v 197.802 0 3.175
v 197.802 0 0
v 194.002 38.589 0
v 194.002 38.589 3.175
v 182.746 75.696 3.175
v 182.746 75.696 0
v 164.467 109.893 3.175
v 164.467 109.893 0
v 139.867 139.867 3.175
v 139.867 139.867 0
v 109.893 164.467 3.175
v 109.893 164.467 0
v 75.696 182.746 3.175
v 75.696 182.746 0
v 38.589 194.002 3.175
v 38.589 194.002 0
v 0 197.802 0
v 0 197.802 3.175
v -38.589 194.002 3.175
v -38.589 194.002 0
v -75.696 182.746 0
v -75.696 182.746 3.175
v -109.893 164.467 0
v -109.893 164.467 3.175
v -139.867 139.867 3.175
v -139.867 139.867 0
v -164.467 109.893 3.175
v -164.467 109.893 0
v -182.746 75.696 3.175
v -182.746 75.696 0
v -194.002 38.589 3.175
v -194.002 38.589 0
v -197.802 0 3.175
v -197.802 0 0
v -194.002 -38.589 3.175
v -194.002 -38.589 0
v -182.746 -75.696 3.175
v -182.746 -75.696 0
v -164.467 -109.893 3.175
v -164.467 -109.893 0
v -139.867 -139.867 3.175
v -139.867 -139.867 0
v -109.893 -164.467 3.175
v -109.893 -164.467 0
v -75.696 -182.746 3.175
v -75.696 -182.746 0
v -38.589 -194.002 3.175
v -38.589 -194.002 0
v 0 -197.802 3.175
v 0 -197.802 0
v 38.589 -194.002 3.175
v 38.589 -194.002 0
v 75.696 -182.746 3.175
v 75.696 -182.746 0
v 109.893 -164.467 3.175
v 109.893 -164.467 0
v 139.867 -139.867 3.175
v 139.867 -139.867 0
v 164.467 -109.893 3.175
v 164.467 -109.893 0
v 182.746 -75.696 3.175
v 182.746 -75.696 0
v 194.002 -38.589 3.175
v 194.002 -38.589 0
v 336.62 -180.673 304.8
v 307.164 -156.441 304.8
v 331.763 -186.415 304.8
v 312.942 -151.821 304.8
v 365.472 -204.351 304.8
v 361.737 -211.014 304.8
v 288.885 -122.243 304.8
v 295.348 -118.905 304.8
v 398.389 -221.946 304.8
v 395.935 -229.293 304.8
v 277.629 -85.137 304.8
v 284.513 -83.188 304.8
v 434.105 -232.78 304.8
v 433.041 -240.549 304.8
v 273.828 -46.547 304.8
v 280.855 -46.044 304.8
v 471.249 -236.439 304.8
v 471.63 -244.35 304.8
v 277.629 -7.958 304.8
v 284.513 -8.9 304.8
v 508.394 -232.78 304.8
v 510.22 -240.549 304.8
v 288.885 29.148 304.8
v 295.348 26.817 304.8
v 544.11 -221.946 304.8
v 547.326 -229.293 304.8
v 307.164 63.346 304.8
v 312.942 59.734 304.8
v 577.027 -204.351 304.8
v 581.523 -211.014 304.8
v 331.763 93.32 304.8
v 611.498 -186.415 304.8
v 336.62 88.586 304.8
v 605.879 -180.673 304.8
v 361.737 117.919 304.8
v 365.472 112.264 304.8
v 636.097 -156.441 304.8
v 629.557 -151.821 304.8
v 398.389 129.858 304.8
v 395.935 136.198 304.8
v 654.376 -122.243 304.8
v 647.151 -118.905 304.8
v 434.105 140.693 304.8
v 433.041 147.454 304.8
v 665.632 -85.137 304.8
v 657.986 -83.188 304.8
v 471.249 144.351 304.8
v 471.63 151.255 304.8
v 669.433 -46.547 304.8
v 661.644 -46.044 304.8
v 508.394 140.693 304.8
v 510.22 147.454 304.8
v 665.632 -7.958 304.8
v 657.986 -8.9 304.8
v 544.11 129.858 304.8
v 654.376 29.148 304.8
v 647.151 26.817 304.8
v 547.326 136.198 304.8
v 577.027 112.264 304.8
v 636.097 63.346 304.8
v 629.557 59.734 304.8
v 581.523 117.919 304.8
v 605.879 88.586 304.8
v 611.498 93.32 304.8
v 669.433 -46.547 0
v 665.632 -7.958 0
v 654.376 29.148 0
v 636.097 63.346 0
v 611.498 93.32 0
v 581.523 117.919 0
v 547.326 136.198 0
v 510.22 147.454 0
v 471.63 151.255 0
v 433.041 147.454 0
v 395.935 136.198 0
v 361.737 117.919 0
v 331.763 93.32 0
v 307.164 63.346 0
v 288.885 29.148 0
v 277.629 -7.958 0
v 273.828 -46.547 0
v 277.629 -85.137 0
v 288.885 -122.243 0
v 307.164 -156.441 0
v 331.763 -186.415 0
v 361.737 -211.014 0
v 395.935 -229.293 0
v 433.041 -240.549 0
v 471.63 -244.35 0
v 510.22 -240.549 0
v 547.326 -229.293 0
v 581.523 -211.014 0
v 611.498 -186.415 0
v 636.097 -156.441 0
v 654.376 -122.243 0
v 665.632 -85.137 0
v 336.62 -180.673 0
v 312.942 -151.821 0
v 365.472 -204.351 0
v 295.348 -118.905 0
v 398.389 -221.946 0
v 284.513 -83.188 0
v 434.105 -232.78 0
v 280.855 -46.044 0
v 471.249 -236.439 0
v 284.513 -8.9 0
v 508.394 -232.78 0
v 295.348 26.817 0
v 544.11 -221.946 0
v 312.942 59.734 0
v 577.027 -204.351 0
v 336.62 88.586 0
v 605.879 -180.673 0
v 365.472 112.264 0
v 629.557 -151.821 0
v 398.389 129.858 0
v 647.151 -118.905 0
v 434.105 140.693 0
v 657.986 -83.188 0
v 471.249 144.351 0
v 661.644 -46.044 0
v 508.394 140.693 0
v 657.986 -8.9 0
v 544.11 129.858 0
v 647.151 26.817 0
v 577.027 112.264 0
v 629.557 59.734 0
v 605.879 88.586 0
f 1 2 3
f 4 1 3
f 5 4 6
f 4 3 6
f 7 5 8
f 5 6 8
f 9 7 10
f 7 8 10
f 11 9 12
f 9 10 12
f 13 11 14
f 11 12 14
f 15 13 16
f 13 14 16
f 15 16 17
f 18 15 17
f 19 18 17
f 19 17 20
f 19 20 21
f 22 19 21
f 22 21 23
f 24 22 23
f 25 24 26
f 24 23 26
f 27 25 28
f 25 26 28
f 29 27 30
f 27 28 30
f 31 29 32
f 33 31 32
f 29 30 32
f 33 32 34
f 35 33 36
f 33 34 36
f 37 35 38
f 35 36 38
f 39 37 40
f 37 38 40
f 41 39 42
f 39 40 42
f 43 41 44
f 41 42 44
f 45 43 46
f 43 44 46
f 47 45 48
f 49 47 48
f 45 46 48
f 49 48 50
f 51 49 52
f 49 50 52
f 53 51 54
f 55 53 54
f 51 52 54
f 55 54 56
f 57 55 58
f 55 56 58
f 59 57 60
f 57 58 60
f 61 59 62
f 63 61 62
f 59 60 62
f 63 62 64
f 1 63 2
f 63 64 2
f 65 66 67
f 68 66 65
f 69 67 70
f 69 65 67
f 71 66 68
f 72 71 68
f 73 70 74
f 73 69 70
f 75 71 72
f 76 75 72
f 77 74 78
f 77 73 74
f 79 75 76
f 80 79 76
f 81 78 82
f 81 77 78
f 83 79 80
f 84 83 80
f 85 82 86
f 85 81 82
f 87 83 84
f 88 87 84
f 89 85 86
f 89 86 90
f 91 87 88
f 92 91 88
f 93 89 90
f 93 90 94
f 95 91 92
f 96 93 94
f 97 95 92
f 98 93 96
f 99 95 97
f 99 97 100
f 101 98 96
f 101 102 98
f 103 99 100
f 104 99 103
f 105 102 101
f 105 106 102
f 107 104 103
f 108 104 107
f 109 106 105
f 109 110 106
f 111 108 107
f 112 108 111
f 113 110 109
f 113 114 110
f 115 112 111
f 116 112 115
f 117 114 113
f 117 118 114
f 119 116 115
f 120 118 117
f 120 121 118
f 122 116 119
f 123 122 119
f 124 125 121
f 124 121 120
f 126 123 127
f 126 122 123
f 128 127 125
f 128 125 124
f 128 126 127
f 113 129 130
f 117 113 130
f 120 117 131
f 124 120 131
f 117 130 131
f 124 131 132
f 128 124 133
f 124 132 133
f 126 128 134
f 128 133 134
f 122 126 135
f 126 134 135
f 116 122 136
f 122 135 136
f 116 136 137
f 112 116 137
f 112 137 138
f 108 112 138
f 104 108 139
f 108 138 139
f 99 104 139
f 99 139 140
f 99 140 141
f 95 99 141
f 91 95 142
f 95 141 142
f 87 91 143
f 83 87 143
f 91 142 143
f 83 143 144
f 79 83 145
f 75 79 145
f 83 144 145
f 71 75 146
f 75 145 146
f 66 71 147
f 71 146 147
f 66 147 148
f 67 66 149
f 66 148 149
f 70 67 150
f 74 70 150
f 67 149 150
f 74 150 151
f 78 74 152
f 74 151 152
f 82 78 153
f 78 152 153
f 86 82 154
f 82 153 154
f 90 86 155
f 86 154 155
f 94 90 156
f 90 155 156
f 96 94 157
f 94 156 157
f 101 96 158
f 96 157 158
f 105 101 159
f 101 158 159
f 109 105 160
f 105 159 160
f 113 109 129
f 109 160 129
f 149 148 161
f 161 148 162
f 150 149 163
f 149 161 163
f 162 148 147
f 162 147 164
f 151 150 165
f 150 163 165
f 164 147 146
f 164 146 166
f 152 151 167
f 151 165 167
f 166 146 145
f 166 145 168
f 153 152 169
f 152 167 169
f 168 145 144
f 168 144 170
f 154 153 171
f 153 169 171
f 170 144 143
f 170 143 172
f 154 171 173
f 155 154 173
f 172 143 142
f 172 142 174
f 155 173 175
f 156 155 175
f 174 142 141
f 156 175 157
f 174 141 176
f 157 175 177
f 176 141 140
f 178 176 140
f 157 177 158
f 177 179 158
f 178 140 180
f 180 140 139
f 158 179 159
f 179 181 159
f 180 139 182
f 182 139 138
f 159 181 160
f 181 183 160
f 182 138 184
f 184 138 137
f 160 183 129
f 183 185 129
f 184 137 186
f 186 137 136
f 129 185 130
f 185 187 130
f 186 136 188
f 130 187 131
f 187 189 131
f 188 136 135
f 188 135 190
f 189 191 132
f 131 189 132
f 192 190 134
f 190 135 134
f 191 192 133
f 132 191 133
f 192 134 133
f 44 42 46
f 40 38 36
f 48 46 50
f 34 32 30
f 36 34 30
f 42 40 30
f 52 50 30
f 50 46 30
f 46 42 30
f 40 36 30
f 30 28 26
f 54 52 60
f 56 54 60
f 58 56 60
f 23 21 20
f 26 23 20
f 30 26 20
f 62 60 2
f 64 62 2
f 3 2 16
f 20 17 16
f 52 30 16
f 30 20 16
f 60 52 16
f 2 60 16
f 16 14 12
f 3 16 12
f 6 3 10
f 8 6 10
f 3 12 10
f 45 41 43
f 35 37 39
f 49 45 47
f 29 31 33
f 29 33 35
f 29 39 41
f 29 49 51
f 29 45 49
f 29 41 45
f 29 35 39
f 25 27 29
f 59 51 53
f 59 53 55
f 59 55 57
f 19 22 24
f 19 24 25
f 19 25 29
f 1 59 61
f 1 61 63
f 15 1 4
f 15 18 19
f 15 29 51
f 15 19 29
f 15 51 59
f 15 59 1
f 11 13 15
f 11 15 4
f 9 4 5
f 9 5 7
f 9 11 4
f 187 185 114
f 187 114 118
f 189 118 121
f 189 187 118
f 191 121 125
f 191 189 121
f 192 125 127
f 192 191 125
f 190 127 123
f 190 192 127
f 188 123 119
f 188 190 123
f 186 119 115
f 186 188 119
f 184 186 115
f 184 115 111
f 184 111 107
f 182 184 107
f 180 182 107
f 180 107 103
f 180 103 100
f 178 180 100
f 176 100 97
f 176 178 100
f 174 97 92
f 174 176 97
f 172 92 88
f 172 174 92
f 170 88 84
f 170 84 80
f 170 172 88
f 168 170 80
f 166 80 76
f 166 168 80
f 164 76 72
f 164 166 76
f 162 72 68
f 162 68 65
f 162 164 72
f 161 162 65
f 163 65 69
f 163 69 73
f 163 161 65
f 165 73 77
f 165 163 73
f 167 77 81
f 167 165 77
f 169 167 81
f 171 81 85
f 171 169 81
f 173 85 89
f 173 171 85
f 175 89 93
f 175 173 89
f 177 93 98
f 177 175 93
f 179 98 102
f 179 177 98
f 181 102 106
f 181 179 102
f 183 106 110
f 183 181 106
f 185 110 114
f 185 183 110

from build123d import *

# Parameters (mm, degrees)
F0_R     = 197.8025
F1_DEPTH = 3.175
F3_R     = 197.8025
F3_R_2   = 190.394768
F4_DEPTH = 304.8


with BuildPart() as f1:
    # F0 (on Top) → F1 (new body)
    with BuildSketch(Plane.XY):
        Circle(F0_R)
    extrude(amount=F1_DEPTH)


with BuildPart() as f4:
    # F3 (on face) → F4 (new body)
    with BuildSketch(Plane.XY):
        with Locations((471.630305, -46.547394)):
            Circle(F3_R)
        with Locations((471.249461, -46.043791)):
            Circle(F3_R_2, mode=Mode.SUBTRACT)
    extrude(amount=F4_DEPTH)


solid = Compound([f1.part, f4.part])
